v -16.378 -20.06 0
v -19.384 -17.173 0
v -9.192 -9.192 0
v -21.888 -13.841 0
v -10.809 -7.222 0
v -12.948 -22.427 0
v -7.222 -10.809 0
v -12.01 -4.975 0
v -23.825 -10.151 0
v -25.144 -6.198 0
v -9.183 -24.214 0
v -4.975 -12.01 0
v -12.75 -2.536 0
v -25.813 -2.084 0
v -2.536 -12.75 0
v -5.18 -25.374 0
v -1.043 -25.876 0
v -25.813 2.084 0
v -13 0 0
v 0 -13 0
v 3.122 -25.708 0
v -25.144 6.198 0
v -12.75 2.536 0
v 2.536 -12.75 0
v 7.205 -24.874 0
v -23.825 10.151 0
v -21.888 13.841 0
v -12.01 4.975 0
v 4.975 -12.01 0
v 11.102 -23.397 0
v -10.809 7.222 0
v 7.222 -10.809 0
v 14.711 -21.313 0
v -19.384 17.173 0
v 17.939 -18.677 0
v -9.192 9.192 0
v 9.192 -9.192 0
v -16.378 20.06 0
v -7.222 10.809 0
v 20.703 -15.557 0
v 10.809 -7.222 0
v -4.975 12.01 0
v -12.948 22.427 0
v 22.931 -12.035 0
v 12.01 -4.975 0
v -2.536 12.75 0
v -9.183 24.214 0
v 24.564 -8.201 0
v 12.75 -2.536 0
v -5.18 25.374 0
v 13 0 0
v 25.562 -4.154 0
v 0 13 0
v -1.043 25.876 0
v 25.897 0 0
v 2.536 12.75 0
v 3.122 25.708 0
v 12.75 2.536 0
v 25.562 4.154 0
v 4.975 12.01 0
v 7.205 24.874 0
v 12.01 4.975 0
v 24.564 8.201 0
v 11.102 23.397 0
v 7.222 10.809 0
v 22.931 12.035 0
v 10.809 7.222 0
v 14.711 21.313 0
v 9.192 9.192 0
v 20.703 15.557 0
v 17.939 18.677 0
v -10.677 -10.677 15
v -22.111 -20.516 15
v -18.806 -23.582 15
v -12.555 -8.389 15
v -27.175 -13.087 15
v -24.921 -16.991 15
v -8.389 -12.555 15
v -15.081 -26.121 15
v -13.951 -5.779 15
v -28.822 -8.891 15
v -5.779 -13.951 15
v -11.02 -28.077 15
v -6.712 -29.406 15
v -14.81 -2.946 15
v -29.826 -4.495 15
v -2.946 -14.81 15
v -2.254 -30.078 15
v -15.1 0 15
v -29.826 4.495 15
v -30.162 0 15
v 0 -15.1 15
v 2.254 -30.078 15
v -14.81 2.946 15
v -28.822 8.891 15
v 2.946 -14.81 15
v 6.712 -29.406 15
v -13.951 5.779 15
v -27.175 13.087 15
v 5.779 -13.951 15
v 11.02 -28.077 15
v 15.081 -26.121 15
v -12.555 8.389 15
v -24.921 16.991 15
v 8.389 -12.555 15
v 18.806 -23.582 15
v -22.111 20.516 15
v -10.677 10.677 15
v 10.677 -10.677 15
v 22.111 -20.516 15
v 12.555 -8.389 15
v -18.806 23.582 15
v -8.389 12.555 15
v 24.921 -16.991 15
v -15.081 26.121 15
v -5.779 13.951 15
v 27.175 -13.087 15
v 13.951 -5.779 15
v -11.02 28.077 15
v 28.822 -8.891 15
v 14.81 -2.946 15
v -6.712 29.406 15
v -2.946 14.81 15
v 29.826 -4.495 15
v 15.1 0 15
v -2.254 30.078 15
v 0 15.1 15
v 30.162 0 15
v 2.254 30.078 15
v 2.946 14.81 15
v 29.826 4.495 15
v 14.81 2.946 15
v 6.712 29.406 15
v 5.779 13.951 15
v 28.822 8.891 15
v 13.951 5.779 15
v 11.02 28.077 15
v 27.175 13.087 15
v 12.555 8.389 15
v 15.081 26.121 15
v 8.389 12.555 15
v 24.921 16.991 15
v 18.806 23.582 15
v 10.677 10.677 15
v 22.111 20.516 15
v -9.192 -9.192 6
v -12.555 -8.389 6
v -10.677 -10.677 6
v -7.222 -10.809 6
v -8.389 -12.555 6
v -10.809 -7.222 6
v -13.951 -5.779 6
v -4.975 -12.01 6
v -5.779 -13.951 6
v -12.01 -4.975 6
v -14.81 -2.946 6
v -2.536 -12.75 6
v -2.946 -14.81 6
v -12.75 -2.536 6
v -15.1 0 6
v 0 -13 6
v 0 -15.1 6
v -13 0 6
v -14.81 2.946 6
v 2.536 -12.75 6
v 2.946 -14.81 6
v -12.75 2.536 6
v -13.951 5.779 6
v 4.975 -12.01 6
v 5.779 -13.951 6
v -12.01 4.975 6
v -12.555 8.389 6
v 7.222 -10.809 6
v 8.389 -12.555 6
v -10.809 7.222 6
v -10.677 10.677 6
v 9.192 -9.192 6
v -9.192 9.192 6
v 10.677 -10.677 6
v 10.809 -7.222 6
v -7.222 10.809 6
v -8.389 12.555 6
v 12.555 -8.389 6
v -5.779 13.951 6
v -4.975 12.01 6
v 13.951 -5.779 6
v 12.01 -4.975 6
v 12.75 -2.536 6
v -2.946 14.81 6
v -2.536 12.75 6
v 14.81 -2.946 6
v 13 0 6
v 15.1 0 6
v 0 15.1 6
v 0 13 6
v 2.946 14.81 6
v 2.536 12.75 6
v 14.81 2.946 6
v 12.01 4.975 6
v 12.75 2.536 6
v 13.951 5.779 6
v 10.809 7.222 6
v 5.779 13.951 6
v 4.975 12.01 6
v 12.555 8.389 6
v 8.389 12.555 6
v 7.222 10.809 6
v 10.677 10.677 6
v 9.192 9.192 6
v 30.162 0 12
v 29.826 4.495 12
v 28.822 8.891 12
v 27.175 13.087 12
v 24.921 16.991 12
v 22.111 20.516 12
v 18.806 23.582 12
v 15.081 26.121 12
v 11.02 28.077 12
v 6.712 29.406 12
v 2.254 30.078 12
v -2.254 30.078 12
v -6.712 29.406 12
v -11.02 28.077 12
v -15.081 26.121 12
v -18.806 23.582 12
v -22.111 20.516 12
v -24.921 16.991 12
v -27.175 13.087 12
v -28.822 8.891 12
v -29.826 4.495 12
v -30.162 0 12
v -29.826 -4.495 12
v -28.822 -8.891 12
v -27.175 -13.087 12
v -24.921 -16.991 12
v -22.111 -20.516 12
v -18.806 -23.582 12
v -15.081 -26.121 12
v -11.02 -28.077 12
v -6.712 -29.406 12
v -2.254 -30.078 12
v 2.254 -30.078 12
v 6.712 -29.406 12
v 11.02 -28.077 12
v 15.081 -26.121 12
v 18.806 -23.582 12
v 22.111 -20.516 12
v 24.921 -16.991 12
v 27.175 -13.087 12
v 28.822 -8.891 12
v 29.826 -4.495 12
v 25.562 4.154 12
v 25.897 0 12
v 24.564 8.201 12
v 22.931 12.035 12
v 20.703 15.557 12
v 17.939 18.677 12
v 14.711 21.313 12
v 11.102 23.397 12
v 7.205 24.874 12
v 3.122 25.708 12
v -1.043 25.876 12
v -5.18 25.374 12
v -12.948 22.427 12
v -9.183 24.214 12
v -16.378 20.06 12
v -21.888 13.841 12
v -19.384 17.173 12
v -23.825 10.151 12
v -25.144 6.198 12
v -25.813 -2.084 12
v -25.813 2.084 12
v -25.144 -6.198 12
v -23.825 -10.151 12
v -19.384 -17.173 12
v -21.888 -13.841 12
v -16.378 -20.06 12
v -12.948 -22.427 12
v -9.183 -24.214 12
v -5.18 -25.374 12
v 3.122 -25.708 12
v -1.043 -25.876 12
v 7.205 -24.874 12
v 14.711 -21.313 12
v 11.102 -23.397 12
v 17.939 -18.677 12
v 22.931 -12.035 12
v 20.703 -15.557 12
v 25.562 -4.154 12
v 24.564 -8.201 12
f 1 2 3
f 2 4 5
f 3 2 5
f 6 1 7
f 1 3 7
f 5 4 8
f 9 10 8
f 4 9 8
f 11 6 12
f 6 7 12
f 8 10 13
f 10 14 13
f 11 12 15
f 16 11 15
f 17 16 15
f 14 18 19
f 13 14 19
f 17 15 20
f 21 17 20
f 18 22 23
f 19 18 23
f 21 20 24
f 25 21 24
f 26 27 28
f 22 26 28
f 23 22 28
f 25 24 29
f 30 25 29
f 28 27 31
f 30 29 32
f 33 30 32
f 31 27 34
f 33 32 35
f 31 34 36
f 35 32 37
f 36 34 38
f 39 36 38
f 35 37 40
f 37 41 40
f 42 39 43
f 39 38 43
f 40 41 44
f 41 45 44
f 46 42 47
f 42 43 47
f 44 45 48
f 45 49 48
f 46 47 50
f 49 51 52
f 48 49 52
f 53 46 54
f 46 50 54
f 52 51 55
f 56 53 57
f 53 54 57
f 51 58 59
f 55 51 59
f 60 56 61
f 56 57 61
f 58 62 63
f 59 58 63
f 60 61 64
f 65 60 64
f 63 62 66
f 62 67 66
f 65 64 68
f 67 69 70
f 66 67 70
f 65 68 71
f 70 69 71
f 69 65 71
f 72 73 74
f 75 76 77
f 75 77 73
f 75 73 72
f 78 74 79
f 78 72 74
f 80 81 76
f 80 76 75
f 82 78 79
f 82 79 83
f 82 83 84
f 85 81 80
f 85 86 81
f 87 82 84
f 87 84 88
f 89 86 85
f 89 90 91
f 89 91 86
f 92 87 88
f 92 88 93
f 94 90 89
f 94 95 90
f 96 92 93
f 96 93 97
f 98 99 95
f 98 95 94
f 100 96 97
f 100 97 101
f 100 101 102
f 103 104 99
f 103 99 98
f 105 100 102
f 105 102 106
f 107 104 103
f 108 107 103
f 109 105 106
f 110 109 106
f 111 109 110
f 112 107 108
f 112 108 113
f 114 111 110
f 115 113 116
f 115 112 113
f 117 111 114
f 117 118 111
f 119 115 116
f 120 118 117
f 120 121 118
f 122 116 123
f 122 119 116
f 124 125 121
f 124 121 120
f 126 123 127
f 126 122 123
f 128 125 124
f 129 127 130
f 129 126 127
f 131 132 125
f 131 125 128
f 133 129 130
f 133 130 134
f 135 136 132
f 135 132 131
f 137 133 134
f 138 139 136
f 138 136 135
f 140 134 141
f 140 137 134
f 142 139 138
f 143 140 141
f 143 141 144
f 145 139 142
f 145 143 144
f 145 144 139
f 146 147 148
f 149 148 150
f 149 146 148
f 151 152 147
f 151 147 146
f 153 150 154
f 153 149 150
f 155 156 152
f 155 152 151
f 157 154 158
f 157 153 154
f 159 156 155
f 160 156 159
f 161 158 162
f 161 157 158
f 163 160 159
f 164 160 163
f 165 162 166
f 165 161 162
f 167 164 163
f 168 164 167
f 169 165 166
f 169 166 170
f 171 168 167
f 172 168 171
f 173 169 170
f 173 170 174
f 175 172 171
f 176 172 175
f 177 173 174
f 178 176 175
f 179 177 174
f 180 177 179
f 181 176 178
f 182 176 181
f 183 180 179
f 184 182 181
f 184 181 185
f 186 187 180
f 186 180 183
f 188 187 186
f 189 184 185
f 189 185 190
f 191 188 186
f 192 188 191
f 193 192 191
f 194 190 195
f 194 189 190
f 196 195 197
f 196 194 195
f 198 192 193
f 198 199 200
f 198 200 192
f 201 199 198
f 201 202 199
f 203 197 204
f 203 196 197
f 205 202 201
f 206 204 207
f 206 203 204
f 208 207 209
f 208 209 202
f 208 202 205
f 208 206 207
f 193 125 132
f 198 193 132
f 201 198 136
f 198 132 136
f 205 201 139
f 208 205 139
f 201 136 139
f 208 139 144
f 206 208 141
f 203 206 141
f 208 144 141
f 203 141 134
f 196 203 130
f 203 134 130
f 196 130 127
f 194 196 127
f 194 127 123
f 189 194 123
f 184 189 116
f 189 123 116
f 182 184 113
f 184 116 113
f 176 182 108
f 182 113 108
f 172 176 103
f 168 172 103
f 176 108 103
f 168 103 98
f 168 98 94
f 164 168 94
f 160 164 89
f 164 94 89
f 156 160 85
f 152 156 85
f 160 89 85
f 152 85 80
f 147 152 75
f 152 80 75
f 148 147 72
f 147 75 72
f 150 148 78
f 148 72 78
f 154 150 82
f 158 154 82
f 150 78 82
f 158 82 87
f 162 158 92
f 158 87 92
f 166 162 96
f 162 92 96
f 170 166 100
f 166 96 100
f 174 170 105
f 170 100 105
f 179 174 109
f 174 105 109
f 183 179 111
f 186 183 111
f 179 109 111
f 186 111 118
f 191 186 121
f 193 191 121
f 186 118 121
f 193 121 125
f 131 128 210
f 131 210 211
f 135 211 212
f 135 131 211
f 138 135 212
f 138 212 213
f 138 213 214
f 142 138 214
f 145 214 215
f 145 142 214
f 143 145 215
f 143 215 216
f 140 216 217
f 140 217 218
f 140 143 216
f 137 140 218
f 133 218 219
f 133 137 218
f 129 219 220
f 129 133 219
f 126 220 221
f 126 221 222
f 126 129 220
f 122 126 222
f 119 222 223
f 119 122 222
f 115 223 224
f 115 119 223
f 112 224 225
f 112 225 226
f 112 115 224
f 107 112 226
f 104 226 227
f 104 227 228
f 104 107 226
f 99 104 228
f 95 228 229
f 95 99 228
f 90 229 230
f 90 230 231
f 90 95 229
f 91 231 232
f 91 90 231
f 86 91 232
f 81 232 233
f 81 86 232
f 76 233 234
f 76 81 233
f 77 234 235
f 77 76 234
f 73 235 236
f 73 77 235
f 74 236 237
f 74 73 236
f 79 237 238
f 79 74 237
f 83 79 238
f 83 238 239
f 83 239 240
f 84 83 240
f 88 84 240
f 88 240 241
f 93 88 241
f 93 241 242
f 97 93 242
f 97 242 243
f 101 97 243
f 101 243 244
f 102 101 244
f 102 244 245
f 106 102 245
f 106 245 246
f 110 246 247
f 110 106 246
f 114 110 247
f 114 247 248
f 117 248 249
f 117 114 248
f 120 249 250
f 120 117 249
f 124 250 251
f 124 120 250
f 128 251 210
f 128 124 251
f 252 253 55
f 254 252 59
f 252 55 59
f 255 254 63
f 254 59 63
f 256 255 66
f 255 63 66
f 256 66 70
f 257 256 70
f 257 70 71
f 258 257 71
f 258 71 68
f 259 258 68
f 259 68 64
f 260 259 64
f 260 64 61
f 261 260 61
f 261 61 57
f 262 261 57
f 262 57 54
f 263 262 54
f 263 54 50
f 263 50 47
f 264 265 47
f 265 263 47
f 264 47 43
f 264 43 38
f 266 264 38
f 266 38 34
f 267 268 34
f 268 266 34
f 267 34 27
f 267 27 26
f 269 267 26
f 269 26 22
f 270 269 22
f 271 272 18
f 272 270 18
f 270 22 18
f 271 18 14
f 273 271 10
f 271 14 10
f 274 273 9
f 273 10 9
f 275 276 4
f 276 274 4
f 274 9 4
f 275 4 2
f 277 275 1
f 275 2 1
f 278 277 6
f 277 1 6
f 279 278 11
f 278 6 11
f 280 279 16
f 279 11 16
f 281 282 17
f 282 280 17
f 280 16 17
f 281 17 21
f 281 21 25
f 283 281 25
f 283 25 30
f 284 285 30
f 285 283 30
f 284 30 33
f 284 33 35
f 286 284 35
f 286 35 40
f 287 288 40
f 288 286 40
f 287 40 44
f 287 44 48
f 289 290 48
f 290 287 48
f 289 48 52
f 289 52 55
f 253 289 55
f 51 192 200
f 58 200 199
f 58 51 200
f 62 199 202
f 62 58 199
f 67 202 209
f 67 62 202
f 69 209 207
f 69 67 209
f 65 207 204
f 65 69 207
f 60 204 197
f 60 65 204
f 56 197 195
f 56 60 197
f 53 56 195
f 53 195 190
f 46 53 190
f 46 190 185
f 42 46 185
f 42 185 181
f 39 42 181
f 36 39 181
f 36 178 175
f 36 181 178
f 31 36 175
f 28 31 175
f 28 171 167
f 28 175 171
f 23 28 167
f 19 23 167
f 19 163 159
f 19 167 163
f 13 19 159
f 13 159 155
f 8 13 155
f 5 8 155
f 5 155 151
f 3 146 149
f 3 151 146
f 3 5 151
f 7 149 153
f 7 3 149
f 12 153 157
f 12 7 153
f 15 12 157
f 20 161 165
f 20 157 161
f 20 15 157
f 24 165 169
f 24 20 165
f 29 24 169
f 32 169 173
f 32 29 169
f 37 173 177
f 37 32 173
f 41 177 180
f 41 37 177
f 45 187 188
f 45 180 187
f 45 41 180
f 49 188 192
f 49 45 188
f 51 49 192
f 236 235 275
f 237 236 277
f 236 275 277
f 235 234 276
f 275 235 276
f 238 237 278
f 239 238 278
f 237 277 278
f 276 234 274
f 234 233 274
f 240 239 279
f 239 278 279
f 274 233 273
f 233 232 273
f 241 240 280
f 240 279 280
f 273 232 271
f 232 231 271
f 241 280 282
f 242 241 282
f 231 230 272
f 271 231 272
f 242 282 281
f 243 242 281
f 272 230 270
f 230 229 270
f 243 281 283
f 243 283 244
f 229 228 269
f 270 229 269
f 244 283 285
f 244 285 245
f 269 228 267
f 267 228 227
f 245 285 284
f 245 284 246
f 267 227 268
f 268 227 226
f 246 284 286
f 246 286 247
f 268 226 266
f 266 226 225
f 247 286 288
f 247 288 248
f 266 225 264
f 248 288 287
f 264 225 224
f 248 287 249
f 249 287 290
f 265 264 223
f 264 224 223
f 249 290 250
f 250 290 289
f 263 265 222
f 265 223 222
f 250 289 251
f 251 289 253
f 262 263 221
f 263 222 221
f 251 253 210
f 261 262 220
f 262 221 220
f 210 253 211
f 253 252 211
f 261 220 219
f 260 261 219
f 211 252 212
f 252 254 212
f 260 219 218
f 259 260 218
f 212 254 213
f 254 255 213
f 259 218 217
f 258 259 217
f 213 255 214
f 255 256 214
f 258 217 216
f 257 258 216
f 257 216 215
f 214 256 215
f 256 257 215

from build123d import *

# Parameters (mm, degrees)
SKETCH001_R     = 25.8969
PAD001_DEPTH    = 15
SKETCH004_R     = 30.1625
PAD002_DEPTH    = 3
SKETCH002_R     = 15.1
POCKET_DEPTH    = 9
SKETCH003_R     = 13
POCKET001_DEPTH = 15.001


with BuildPart() as part:
    # Sketch001 → Pad001 (new body)
    with BuildSketch(Plane.XY):
        Circle(SKETCH001_R)
    extrude(amount=PAD001_DEPTH)

    # Sketch004 → Pad002 (join)
    with BuildSketch(Plane.XY.offset(15)):
        Circle(SKETCH004_R)
    extrude(amount=-PAD002_DEPTH)

    # Sketch002 → Pocket (cut)
    with BuildSketch(Plane.XY.offset(15)):
        Circle(SKETCH002_R)
    extrude(amount=-POCKET_DEPTH, mode=Mode.SUBTRACT)

    # Sketch003 → Pocket001 (cut, through all)
    with BuildSketch(Plane.XY):
        Circle(SKETCH003_R)
    extrude(amount=POCKET001_DEPTH, mode=Mode.SUBTRACT)


solid = part.part
